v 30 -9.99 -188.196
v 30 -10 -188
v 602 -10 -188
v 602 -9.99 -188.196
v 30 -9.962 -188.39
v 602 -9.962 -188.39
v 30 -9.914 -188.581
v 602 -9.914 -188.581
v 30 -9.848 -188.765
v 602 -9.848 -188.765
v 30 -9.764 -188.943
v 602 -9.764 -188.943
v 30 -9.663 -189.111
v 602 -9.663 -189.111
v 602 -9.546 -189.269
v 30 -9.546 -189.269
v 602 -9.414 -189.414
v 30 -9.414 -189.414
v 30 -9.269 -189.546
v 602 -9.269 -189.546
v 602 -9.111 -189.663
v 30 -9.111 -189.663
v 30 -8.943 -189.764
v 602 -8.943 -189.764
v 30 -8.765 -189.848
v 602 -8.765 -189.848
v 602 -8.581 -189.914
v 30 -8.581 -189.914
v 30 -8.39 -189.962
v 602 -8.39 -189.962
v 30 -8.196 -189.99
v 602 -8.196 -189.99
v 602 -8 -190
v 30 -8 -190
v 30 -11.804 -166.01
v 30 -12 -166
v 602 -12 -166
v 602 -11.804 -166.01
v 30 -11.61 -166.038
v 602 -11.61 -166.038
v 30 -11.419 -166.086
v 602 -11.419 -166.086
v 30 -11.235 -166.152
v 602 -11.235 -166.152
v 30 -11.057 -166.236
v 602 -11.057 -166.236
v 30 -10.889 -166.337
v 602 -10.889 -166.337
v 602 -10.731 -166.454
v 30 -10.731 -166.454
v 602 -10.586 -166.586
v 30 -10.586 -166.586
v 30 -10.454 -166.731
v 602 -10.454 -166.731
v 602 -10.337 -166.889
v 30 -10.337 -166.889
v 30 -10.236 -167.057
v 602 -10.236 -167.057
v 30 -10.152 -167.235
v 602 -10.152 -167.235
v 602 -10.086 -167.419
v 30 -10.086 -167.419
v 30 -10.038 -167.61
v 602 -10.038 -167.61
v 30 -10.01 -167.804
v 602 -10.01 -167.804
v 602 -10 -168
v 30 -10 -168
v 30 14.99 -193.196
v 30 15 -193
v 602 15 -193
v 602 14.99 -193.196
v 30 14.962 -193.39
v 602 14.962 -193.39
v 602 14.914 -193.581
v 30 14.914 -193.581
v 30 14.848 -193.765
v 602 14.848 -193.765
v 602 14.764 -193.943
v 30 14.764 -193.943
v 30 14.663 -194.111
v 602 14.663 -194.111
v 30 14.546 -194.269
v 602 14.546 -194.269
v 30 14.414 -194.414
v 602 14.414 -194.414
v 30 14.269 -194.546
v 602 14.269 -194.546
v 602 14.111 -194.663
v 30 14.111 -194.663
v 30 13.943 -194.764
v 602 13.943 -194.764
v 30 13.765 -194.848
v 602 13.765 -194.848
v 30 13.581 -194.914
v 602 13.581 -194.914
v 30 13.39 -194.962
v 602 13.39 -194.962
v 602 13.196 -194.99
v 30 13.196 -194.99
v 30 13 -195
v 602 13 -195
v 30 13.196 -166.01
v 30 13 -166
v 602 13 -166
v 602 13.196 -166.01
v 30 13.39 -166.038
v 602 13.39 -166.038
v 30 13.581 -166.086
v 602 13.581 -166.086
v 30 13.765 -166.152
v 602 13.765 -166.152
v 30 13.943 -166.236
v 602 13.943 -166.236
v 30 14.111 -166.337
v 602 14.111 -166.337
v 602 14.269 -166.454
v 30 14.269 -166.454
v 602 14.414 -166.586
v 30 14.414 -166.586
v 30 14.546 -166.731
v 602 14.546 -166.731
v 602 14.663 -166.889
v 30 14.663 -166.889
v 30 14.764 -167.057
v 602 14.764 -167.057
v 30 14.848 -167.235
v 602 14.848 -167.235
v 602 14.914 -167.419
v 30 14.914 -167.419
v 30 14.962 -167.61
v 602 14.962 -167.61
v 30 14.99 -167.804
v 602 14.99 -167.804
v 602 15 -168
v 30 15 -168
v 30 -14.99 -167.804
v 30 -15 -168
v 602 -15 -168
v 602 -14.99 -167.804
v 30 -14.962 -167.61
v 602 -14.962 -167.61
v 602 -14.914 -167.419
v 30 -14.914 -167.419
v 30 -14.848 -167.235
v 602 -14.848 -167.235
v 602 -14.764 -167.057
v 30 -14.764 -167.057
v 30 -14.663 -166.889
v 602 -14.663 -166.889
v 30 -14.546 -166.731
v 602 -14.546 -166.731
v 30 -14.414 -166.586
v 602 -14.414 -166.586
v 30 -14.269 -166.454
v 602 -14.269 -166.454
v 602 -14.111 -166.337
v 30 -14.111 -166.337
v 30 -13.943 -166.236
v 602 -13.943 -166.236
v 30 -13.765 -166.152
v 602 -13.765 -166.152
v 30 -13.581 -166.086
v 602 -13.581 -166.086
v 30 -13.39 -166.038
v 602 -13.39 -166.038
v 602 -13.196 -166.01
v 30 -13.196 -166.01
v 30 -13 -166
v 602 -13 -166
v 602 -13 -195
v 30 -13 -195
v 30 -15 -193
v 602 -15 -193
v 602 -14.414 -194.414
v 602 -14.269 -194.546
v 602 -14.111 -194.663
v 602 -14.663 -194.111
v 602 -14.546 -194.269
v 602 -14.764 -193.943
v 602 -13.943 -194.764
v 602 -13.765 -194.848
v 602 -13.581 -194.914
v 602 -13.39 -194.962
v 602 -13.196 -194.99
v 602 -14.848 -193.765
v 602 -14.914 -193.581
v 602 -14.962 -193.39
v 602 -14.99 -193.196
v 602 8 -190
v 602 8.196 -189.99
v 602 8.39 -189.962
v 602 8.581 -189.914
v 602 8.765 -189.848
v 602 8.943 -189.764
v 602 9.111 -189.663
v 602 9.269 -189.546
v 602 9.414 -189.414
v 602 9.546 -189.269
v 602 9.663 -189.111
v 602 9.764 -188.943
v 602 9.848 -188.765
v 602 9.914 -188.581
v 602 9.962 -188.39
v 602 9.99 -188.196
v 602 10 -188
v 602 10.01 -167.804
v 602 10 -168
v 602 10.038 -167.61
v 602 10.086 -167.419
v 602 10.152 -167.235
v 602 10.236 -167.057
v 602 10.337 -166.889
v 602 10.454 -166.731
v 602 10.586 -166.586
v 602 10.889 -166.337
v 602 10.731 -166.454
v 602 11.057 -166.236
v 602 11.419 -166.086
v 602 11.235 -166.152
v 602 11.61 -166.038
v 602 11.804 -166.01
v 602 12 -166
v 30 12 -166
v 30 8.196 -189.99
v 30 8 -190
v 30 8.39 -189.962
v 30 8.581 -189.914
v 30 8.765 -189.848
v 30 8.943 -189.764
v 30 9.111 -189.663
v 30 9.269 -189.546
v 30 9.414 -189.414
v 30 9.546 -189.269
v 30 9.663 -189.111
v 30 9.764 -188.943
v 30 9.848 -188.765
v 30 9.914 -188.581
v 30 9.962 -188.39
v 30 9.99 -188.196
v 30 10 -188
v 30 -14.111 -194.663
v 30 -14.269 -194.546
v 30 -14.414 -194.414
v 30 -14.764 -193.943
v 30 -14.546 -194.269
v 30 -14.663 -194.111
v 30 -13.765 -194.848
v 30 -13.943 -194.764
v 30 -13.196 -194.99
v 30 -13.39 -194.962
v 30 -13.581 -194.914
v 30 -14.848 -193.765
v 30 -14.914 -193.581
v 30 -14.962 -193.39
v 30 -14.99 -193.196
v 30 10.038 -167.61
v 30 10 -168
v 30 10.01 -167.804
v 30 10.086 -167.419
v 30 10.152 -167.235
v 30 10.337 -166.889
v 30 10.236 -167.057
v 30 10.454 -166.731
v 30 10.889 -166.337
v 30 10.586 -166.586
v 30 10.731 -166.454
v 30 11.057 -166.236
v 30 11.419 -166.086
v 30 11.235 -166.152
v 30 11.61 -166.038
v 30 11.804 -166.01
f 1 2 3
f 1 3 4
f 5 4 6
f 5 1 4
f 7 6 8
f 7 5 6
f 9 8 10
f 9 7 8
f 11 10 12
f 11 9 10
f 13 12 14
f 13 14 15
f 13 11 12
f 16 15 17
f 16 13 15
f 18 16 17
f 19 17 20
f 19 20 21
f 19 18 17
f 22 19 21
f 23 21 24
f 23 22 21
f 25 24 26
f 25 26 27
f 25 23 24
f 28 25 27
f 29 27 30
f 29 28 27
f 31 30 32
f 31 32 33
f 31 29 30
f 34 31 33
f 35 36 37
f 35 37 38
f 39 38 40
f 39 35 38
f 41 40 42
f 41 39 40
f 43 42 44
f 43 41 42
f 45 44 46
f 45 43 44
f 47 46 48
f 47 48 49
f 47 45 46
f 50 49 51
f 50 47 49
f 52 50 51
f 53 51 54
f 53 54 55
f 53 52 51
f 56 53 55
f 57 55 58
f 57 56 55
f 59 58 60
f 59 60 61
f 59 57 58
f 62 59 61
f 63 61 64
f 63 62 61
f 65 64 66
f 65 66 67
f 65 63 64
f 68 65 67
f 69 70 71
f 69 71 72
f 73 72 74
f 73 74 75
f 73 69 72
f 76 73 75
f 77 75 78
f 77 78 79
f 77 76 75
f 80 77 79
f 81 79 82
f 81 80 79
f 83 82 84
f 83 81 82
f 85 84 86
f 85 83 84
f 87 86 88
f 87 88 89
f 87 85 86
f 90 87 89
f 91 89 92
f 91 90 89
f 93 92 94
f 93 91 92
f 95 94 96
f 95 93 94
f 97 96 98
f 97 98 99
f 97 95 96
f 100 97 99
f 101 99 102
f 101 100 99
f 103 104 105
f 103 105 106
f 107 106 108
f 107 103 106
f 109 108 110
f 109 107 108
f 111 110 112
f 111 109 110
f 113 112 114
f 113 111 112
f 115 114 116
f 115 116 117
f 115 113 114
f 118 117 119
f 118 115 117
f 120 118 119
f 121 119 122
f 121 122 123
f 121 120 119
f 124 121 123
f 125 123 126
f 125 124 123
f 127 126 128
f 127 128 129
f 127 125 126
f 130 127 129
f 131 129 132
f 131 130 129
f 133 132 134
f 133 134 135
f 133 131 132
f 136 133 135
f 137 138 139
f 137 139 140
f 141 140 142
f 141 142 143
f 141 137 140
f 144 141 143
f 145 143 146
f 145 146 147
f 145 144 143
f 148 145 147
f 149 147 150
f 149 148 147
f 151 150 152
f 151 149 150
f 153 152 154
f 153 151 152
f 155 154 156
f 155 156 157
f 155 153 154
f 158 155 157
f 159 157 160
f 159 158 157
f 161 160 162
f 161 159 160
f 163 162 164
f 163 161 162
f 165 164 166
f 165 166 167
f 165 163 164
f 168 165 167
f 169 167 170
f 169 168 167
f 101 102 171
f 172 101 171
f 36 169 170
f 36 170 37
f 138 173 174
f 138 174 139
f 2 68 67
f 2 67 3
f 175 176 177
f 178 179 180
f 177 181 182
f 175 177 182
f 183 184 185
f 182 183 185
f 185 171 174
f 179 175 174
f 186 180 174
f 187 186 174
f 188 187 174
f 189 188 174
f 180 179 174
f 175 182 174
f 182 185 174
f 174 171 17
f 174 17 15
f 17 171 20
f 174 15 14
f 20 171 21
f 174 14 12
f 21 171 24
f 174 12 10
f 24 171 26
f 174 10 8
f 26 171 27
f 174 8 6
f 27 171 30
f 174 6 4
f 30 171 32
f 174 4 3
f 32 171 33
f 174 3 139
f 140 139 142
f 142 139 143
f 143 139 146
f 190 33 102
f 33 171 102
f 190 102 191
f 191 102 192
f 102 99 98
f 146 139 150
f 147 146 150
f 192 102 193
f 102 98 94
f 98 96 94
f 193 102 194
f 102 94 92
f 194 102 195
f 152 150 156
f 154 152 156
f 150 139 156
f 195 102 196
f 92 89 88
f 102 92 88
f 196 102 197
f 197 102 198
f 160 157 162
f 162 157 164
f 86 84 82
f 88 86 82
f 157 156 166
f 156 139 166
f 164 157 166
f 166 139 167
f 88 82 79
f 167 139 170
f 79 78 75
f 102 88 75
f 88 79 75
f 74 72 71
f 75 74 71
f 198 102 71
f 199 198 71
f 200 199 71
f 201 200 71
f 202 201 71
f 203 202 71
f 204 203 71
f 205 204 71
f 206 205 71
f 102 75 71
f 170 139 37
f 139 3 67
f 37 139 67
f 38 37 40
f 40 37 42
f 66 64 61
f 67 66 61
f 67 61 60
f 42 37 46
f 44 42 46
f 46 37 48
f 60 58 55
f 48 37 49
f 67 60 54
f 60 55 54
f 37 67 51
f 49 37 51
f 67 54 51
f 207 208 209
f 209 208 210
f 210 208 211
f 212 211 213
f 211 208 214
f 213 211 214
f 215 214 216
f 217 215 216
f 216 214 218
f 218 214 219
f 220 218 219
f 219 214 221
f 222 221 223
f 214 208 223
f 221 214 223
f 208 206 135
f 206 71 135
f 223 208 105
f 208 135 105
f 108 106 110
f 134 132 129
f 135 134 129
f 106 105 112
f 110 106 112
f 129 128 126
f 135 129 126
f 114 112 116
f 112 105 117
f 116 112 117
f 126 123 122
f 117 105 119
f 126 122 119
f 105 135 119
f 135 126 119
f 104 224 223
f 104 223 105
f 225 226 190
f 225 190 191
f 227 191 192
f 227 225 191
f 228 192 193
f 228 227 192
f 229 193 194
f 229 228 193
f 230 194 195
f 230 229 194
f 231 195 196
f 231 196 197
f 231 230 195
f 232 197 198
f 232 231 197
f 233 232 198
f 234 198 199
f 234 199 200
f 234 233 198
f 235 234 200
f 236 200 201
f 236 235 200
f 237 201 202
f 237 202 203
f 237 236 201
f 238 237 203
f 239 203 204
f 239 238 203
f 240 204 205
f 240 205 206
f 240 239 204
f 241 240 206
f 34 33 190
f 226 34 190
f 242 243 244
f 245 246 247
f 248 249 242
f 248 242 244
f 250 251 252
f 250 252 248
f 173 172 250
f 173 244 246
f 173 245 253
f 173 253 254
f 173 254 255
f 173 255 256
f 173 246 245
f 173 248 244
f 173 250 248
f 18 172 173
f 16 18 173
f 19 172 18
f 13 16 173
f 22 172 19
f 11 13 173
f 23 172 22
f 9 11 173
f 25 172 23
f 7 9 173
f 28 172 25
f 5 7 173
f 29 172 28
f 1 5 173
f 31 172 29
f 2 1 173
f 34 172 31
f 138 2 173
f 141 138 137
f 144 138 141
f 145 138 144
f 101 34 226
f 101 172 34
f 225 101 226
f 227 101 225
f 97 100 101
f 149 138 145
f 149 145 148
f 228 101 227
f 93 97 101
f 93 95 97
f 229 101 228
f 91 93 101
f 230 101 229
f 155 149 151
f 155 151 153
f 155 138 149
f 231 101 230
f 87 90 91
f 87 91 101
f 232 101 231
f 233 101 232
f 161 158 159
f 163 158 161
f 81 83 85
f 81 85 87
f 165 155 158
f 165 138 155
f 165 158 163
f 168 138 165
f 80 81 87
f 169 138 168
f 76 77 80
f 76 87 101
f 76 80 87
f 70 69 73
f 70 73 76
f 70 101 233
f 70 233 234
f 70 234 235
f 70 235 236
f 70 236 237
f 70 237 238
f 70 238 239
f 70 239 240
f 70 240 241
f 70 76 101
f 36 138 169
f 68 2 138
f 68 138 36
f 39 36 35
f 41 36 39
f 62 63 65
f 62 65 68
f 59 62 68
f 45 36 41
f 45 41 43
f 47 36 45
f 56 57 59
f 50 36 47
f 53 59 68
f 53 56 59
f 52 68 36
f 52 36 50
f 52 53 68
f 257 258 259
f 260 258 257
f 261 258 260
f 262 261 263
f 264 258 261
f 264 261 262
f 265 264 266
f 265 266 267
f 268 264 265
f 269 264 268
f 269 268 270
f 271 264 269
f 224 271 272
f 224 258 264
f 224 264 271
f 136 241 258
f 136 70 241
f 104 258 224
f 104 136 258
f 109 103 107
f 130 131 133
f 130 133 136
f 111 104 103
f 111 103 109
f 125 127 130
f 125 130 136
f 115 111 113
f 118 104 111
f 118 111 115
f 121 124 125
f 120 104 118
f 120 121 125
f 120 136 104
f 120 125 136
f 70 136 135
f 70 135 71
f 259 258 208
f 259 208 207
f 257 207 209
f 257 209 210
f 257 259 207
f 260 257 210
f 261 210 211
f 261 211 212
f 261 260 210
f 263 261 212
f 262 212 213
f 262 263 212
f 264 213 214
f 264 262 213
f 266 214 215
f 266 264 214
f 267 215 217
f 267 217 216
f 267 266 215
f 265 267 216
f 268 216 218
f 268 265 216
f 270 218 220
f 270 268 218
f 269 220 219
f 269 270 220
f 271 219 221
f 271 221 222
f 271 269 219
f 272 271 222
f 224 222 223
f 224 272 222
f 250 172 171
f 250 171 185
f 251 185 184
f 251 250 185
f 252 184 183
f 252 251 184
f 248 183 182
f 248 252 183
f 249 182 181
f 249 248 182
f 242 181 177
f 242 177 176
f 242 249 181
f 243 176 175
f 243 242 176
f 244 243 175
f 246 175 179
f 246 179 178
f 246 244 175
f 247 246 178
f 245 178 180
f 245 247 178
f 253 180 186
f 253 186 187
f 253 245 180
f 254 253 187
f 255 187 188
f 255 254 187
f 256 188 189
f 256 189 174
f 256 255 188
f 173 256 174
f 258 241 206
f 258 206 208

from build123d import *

# Parameters (mm, degrees)
BOSS_EXTRUDE1_START = 30
BOSS_EXTRUDE1_DEPTH = 572


with BuildPart() as part:
    # Sketch4 → Boss-Extrude1 (new body)
    with BuildSketch(Plane(origin=(0, 0, 0), x_dir=(0, 0, -1), z_dir=(1, 0, 0)).offset(BOSS_EXTRUDE1_START)):
        with BuildLine():
            Line((195, 13), (195, -13))
            ThreePointArc((195, -13), (194.414213562, -14.414213562), (193, -15))
            Line((193, -15), (168, -15))
            ThreePointArc((168, -15), (166.585786438, -14.414213562), (166, -13))
            Line((166, -13), (166, -12))
            ThreePointArc((166, -12), (166.585786438, -10.585786438), (168, -10))
            Line((168, -10), (188, -10))
            ThreePointArc((188, -10), (189.414213562, -9.414213562), (190, -8))
            Line((190, -8), (190, 8))
            ThreePointArc((190, 8), (189.414213562, 9.414213562), (188, 10))
            Line((188, 10), (168, 10))
            ThreePointArc((168, 10), (166.585786438, 10.585786438), (166, 12))
            Line((166, 12), (166, 13))
            ThreePointArc((166, 13), (166.585786438, 14.414213562), (168, 15))
            Line((168, 15), (193, 15))
            ThreePointArc((193, 15), (194.414213562, 14.414213562), (195, 13))
        make_face()
    extrude(amount=BOSS_EXTRUDE1_DEPTH)


solid = part.part
